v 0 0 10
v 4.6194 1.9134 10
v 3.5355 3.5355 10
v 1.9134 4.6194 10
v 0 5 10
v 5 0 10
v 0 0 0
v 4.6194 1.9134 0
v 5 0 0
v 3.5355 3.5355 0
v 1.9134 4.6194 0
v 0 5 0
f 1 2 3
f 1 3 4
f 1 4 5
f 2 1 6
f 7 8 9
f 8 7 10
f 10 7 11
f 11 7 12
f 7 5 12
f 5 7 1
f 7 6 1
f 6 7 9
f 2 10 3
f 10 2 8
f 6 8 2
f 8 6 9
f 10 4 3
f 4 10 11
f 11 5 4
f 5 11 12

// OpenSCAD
intersection() {
  cube([10,10,10]);
  cylinder(h=15, r=5); 
}

%color([0.5,0.5,1], alpha=0.3) {
  cube([10,10,10]);
  cylinder(h=15, r=5); 
}
